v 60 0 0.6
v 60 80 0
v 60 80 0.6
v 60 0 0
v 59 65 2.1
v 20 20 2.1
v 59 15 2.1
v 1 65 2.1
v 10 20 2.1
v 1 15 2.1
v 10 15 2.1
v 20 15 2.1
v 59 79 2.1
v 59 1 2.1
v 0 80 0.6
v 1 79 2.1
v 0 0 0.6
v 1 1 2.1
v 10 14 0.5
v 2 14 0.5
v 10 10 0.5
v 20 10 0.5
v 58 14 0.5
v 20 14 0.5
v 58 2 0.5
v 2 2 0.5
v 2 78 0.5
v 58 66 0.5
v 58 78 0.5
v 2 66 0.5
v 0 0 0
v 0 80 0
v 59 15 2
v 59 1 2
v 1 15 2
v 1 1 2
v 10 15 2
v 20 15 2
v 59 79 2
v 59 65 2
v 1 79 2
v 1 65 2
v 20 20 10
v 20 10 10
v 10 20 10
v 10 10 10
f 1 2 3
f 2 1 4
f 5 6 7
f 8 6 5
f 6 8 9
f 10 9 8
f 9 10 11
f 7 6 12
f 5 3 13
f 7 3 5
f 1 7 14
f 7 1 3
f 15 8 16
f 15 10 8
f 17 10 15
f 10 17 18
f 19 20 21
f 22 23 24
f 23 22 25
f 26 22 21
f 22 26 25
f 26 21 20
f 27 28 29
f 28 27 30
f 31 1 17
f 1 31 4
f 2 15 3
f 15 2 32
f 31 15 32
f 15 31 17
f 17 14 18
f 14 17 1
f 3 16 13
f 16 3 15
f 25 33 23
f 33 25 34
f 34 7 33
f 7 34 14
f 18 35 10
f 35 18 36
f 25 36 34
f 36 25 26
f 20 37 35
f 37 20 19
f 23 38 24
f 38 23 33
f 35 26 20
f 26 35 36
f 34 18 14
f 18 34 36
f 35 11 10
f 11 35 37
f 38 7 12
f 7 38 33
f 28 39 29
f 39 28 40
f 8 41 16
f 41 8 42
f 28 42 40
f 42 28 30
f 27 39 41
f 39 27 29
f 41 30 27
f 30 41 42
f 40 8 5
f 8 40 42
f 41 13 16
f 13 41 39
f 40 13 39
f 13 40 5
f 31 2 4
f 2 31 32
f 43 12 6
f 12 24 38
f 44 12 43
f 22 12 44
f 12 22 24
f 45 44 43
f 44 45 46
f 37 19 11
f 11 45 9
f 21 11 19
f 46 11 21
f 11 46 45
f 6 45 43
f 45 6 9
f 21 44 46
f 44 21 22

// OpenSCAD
echo(version=version());
// Base Config
base_W = 60; // Min Size < 10
base_H = 80; // Min Size < 40
base_T = 0.5; // Fix Size = 0.5 for Stapler
default_S = 12; // Fix Size = 12 for Stapler (Stapler size)
default_T = 2.0; // Fix Size = 2.0 for Stapler (base_T < default_T)
$fn = 60;

staple_base(base_T,base_W,base_H,default_S,default_T);
// Dummy object
* translate([base_W / 4, base_H / 4, 22]) rotate([45, 45, 45]) cube(base_W / 2);

module stapler_area(bt,bw,ds,dt) {
    hull() {
        translate([0, 0, dt - bt]) cube([bw - dt, ds + 2, 0.1]);
        translate([1, 1, 0]) cube([bw - dt * 2, ds, 0.1]);
    }
}

module staple_base(bt,bw,bh,ds,dt) {
    union() {
        // Base1(Bottom)
        cube([bw, bh, bt]);
        // Base2(Top)
        translate([0, 0, bt]) {
            difference() {
                // Base2_body
                hull() {
                    translate([1, 1, dt - bt]) cube([bw - 2, bh - 2, 0.1]);
                    translate([0, 0, 0]) cube([bw, bh, 0.1]);
                }
                // Base2_stapler_area1(Top)
                # translate([dt - 1, dt - 1, 0]) stapler_area(bt,bw,ds,dt);
                // Base2_stapler_area2(Bottom)
                # translate([dt - 1, bh - ds - dt - 1, 0]) stapler_area(bt,bw,ds,dt);
            }
        }
    }
}

translate([10, 10, 0]) cube([10, 10, 10]);
